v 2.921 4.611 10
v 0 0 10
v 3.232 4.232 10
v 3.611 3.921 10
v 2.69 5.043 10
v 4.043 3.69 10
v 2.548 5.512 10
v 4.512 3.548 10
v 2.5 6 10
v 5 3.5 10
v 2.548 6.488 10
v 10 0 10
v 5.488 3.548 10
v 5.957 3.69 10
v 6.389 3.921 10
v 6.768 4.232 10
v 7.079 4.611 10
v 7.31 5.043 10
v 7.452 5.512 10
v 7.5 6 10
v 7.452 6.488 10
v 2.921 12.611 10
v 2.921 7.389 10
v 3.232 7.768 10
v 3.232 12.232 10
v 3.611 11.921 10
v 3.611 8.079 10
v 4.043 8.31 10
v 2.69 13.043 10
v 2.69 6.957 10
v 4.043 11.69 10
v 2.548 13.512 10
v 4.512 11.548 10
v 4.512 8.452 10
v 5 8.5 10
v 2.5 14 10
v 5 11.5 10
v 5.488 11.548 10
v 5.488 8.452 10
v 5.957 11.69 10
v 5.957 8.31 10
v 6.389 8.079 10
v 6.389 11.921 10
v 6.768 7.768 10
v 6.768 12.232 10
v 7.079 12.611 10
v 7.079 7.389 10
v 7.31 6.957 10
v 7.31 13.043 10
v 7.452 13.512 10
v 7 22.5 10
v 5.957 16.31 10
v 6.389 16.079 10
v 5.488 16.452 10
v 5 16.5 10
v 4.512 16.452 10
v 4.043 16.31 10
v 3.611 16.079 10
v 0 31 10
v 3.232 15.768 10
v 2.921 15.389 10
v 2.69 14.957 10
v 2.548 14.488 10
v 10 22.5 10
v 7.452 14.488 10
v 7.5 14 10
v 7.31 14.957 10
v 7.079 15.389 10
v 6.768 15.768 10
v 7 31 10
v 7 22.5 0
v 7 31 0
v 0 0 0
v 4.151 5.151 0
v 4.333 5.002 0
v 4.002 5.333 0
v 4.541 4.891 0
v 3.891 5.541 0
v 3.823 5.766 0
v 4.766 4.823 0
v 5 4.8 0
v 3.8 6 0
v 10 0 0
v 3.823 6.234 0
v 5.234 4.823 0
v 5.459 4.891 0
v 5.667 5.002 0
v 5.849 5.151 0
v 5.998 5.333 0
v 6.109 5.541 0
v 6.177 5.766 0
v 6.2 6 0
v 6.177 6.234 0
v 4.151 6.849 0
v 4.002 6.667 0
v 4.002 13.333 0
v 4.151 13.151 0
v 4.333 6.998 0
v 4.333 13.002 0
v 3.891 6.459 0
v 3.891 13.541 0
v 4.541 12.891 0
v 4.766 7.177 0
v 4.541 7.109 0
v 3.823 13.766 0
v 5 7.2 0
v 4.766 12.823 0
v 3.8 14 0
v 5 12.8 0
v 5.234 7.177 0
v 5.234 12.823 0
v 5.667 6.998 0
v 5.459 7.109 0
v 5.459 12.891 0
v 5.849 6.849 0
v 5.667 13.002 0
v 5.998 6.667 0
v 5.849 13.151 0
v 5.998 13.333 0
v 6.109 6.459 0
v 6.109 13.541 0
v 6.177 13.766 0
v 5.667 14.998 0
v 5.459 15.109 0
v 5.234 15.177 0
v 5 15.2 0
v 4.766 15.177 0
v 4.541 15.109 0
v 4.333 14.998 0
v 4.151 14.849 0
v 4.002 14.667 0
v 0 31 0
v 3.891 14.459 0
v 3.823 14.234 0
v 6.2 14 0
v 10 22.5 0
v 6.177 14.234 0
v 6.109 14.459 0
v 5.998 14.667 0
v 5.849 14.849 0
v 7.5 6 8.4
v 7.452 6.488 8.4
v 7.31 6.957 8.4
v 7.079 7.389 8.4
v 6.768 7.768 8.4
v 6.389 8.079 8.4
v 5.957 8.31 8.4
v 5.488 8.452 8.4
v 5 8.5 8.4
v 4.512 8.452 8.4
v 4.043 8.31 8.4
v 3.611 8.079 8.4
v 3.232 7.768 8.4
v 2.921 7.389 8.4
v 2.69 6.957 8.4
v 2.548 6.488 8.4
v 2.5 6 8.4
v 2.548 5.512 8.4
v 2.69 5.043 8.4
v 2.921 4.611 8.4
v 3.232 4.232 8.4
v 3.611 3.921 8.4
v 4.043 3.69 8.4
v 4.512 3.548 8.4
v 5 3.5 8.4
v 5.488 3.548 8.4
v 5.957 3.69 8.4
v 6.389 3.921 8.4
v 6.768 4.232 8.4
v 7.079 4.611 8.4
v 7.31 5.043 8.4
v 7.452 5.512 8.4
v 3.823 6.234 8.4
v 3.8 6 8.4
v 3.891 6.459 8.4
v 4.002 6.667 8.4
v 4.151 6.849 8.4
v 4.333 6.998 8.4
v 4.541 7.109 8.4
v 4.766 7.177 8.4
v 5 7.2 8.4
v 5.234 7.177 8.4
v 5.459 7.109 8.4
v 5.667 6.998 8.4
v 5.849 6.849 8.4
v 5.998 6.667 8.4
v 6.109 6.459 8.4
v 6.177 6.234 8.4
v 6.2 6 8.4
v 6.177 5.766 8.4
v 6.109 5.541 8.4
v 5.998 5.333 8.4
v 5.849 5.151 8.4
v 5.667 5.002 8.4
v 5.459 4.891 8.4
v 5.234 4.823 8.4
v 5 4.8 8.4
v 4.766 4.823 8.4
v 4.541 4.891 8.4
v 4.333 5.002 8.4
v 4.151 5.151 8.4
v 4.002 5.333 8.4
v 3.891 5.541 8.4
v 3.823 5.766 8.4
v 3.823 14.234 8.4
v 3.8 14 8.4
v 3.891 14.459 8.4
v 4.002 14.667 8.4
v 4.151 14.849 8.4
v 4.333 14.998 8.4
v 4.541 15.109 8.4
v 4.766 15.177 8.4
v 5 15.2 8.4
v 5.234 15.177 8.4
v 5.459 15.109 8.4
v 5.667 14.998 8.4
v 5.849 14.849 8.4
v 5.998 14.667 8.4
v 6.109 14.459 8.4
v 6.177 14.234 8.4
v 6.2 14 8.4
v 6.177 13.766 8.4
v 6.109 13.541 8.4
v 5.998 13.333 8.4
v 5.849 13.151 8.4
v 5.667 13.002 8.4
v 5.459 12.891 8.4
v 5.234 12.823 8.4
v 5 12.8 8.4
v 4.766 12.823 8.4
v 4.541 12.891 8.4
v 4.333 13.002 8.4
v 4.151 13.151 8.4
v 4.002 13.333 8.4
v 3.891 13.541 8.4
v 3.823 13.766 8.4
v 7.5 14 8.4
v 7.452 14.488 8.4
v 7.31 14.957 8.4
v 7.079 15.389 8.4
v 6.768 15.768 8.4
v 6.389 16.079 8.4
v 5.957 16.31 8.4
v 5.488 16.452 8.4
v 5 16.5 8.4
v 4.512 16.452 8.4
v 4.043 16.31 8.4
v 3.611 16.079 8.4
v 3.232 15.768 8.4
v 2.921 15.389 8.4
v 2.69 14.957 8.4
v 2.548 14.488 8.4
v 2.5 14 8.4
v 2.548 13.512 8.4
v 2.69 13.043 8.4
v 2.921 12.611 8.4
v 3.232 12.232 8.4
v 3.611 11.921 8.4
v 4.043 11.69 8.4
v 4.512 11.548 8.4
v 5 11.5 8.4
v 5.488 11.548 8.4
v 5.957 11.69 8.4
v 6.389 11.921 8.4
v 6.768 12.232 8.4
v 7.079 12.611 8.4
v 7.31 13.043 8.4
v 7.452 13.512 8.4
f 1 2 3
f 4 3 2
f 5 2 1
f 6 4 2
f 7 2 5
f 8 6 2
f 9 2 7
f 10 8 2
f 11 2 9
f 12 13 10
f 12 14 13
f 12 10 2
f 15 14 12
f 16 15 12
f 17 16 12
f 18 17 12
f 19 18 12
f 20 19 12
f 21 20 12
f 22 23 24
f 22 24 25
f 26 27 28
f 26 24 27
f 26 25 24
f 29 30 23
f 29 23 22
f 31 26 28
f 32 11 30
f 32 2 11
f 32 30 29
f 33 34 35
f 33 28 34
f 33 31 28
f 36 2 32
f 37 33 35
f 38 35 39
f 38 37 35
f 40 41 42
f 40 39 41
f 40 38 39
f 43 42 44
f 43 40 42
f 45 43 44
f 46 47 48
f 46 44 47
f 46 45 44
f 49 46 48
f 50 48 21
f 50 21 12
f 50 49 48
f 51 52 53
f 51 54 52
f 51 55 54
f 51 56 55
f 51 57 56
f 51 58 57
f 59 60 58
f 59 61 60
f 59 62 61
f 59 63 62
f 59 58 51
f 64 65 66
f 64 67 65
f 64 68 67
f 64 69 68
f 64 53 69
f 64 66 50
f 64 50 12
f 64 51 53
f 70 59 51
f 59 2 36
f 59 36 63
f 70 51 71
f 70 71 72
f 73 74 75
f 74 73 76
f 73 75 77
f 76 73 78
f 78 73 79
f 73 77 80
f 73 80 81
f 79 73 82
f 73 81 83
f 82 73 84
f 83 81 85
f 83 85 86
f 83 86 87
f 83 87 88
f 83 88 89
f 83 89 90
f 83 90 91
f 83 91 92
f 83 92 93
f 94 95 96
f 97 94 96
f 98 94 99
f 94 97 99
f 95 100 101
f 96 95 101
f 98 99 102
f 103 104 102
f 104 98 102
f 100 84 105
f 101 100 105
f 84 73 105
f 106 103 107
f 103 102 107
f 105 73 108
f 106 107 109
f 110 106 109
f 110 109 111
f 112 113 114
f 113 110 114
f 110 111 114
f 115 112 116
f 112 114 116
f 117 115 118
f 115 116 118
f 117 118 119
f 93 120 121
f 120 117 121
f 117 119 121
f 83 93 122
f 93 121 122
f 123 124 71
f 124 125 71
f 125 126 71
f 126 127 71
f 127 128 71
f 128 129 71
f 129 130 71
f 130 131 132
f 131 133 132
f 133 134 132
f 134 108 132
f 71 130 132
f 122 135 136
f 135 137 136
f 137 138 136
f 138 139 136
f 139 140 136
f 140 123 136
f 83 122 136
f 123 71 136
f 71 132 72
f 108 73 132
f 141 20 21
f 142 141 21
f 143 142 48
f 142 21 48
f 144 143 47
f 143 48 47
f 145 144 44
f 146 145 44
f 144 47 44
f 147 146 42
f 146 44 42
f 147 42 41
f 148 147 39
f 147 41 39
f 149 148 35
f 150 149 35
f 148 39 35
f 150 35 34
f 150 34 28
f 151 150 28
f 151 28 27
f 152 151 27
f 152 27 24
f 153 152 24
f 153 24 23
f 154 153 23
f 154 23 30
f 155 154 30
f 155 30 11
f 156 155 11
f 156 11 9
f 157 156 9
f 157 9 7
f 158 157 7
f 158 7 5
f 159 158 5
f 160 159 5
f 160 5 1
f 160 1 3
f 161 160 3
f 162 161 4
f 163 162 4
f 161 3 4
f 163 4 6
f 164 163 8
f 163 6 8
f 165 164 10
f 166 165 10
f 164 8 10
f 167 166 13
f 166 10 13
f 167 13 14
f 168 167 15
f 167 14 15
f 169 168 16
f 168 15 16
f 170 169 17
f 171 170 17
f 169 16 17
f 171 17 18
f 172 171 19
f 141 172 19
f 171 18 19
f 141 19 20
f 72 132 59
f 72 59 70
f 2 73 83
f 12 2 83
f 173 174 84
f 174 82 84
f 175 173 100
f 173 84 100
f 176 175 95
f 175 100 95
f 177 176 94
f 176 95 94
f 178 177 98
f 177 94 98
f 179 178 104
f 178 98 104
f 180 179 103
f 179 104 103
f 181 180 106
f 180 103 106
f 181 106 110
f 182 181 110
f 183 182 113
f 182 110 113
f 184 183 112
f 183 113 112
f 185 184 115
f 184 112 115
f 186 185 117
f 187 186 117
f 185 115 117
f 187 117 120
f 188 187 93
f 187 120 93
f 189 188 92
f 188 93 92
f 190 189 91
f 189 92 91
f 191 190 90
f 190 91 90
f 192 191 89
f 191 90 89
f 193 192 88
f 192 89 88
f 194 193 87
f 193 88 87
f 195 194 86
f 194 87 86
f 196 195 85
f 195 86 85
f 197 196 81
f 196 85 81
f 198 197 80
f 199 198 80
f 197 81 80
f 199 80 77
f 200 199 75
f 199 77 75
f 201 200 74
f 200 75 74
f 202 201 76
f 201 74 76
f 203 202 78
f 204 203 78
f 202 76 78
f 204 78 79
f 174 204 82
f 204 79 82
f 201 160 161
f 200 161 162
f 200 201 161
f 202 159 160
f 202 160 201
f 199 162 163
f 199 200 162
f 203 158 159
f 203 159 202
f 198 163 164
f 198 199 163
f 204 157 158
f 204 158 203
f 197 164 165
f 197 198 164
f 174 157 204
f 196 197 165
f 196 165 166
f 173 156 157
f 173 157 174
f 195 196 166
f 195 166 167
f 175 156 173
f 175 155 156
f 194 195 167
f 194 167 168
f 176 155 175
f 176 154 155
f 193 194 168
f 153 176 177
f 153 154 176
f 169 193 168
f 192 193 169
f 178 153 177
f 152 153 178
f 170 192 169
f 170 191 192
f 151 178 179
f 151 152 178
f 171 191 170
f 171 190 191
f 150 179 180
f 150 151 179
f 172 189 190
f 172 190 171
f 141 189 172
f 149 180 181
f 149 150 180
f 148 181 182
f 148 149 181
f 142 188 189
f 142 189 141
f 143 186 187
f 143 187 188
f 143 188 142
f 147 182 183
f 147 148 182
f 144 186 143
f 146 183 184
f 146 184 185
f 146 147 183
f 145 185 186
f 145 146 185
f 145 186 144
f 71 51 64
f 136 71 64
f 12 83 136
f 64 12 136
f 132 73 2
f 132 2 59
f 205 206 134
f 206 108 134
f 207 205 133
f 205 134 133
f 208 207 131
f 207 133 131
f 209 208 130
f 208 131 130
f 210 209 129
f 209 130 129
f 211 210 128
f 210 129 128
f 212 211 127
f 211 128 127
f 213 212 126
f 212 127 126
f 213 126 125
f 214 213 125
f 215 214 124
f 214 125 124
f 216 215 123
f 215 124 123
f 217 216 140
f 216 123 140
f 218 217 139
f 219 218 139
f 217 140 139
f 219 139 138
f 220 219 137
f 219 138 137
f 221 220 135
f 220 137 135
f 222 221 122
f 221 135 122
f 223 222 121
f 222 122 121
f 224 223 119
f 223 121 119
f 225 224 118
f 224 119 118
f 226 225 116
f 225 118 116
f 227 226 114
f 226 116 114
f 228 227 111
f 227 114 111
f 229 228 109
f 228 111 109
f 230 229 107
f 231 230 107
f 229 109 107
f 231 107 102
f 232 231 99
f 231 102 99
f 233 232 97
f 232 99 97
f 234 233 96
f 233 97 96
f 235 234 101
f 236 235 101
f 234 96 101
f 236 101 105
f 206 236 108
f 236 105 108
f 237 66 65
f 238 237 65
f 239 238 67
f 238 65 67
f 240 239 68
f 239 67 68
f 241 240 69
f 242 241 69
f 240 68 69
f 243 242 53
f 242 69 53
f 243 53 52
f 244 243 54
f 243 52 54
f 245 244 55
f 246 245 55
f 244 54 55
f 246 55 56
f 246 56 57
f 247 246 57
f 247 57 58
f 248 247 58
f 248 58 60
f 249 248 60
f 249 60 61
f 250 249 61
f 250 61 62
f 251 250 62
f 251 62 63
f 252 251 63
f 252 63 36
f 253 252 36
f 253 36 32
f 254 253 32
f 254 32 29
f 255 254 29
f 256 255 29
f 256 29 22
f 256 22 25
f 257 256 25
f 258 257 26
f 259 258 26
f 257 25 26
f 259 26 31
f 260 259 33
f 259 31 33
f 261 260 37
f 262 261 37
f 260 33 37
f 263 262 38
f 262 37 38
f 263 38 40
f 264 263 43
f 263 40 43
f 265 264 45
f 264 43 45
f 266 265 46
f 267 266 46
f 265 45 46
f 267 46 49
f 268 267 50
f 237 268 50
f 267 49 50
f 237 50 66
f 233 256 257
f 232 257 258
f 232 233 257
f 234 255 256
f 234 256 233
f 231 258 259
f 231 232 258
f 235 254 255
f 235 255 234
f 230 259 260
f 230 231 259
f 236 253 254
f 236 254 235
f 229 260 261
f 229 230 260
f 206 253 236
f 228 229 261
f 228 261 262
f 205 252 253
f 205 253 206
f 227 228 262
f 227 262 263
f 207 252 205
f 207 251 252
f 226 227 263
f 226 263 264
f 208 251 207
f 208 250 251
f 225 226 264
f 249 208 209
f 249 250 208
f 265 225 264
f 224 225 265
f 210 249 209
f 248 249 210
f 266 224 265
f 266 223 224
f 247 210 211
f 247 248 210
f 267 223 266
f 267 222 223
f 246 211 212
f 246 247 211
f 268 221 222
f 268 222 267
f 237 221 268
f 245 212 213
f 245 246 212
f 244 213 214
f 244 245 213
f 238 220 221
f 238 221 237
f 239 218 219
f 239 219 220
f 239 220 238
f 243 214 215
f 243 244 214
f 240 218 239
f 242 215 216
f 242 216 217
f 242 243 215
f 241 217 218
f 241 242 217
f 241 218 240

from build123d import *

# Parameters (mm, degrees)
SKETCH1_W                                = 10
SKETCH1_H                                = 31
BOSS_EXTRUDE1_DEPTH                      = 10
SKETCH2_W                                = 3
SKETCH2_H                                = 8.5
CUT_EXTRUDE1_DEPTH                       = 10
CBORE_FOR_M2_PAN_HEAD_SCREW1_D           = 2.4
CBORE_FOR_M2_PAN_HEAD_SCREW1_DEPTH       = 10
CBORE_FOR_M2_PAN_HEAD_SCREW1_CBORE_D     = 5
CBORE_FOR_M2_PAN_HEAD_SCREW1_CBORE_DEPTH = 1.6
CBORE_FOR_M2_PAN_HEAD_SCREW1_TIP         = 0.721032743


with BuildPart() as part:
    # Sketch1 → Boss-Extrude1 (new body)
    with BuildSketch(Plane.XY):
        with Locations((5, 15.5)):
            Rectangle(SKETCH1_W, SKETCH1_H)
    extrude(amount=BOSS_EXTRUDE1_DEPTH)

    # Sketch2 → Cut-Extrude1 (cut)
    with BuildSketch(Plane.XY.offset(10)):
        with Locations((8.5, 26.75)):
            Rectangle(SKETCH2_W, SKETCH2_H)
    extrude(amount=-CUT_EXTRUDE1_DEPTH, mode=Mode.SUBTRACT)

    # CBORE for M2 Pan Head Screw1
    with Locations(Plane.XY.offset(10)):
        with Locations((5, 14), (5, 6)):
            CounterBoreHole(CBORE_FOR_M2_PAN_HEAD_SCREW1_D / 2, CBORE_FOR_M2_PAN_HEAD_SCREW1_CBORE_D / 2, CBORE_FOR_M2_PAN_HEAD_SCREW1_CBORE_DEPTH, depth=CBORE_FOR_M2_PAN_HEAD_SCREW1_DEPTH)
            with Locations((0, 0, -(CBORE_FOR_M2_PAN_HEAD_SCREW1_DEPTH + CBORE_FOR_M2_PAN_HEAD_SCREW1_TIP / 2))):  # 118° drill point
                Cone(0, CBORE_FOR_M2_PAN_HEAD_SCREW1_D / 2, CBORE_FOR_M2_PAN_HEAD_SCREW1_TIP, mode=Mode.SUBTRACT)


solid = part.part
